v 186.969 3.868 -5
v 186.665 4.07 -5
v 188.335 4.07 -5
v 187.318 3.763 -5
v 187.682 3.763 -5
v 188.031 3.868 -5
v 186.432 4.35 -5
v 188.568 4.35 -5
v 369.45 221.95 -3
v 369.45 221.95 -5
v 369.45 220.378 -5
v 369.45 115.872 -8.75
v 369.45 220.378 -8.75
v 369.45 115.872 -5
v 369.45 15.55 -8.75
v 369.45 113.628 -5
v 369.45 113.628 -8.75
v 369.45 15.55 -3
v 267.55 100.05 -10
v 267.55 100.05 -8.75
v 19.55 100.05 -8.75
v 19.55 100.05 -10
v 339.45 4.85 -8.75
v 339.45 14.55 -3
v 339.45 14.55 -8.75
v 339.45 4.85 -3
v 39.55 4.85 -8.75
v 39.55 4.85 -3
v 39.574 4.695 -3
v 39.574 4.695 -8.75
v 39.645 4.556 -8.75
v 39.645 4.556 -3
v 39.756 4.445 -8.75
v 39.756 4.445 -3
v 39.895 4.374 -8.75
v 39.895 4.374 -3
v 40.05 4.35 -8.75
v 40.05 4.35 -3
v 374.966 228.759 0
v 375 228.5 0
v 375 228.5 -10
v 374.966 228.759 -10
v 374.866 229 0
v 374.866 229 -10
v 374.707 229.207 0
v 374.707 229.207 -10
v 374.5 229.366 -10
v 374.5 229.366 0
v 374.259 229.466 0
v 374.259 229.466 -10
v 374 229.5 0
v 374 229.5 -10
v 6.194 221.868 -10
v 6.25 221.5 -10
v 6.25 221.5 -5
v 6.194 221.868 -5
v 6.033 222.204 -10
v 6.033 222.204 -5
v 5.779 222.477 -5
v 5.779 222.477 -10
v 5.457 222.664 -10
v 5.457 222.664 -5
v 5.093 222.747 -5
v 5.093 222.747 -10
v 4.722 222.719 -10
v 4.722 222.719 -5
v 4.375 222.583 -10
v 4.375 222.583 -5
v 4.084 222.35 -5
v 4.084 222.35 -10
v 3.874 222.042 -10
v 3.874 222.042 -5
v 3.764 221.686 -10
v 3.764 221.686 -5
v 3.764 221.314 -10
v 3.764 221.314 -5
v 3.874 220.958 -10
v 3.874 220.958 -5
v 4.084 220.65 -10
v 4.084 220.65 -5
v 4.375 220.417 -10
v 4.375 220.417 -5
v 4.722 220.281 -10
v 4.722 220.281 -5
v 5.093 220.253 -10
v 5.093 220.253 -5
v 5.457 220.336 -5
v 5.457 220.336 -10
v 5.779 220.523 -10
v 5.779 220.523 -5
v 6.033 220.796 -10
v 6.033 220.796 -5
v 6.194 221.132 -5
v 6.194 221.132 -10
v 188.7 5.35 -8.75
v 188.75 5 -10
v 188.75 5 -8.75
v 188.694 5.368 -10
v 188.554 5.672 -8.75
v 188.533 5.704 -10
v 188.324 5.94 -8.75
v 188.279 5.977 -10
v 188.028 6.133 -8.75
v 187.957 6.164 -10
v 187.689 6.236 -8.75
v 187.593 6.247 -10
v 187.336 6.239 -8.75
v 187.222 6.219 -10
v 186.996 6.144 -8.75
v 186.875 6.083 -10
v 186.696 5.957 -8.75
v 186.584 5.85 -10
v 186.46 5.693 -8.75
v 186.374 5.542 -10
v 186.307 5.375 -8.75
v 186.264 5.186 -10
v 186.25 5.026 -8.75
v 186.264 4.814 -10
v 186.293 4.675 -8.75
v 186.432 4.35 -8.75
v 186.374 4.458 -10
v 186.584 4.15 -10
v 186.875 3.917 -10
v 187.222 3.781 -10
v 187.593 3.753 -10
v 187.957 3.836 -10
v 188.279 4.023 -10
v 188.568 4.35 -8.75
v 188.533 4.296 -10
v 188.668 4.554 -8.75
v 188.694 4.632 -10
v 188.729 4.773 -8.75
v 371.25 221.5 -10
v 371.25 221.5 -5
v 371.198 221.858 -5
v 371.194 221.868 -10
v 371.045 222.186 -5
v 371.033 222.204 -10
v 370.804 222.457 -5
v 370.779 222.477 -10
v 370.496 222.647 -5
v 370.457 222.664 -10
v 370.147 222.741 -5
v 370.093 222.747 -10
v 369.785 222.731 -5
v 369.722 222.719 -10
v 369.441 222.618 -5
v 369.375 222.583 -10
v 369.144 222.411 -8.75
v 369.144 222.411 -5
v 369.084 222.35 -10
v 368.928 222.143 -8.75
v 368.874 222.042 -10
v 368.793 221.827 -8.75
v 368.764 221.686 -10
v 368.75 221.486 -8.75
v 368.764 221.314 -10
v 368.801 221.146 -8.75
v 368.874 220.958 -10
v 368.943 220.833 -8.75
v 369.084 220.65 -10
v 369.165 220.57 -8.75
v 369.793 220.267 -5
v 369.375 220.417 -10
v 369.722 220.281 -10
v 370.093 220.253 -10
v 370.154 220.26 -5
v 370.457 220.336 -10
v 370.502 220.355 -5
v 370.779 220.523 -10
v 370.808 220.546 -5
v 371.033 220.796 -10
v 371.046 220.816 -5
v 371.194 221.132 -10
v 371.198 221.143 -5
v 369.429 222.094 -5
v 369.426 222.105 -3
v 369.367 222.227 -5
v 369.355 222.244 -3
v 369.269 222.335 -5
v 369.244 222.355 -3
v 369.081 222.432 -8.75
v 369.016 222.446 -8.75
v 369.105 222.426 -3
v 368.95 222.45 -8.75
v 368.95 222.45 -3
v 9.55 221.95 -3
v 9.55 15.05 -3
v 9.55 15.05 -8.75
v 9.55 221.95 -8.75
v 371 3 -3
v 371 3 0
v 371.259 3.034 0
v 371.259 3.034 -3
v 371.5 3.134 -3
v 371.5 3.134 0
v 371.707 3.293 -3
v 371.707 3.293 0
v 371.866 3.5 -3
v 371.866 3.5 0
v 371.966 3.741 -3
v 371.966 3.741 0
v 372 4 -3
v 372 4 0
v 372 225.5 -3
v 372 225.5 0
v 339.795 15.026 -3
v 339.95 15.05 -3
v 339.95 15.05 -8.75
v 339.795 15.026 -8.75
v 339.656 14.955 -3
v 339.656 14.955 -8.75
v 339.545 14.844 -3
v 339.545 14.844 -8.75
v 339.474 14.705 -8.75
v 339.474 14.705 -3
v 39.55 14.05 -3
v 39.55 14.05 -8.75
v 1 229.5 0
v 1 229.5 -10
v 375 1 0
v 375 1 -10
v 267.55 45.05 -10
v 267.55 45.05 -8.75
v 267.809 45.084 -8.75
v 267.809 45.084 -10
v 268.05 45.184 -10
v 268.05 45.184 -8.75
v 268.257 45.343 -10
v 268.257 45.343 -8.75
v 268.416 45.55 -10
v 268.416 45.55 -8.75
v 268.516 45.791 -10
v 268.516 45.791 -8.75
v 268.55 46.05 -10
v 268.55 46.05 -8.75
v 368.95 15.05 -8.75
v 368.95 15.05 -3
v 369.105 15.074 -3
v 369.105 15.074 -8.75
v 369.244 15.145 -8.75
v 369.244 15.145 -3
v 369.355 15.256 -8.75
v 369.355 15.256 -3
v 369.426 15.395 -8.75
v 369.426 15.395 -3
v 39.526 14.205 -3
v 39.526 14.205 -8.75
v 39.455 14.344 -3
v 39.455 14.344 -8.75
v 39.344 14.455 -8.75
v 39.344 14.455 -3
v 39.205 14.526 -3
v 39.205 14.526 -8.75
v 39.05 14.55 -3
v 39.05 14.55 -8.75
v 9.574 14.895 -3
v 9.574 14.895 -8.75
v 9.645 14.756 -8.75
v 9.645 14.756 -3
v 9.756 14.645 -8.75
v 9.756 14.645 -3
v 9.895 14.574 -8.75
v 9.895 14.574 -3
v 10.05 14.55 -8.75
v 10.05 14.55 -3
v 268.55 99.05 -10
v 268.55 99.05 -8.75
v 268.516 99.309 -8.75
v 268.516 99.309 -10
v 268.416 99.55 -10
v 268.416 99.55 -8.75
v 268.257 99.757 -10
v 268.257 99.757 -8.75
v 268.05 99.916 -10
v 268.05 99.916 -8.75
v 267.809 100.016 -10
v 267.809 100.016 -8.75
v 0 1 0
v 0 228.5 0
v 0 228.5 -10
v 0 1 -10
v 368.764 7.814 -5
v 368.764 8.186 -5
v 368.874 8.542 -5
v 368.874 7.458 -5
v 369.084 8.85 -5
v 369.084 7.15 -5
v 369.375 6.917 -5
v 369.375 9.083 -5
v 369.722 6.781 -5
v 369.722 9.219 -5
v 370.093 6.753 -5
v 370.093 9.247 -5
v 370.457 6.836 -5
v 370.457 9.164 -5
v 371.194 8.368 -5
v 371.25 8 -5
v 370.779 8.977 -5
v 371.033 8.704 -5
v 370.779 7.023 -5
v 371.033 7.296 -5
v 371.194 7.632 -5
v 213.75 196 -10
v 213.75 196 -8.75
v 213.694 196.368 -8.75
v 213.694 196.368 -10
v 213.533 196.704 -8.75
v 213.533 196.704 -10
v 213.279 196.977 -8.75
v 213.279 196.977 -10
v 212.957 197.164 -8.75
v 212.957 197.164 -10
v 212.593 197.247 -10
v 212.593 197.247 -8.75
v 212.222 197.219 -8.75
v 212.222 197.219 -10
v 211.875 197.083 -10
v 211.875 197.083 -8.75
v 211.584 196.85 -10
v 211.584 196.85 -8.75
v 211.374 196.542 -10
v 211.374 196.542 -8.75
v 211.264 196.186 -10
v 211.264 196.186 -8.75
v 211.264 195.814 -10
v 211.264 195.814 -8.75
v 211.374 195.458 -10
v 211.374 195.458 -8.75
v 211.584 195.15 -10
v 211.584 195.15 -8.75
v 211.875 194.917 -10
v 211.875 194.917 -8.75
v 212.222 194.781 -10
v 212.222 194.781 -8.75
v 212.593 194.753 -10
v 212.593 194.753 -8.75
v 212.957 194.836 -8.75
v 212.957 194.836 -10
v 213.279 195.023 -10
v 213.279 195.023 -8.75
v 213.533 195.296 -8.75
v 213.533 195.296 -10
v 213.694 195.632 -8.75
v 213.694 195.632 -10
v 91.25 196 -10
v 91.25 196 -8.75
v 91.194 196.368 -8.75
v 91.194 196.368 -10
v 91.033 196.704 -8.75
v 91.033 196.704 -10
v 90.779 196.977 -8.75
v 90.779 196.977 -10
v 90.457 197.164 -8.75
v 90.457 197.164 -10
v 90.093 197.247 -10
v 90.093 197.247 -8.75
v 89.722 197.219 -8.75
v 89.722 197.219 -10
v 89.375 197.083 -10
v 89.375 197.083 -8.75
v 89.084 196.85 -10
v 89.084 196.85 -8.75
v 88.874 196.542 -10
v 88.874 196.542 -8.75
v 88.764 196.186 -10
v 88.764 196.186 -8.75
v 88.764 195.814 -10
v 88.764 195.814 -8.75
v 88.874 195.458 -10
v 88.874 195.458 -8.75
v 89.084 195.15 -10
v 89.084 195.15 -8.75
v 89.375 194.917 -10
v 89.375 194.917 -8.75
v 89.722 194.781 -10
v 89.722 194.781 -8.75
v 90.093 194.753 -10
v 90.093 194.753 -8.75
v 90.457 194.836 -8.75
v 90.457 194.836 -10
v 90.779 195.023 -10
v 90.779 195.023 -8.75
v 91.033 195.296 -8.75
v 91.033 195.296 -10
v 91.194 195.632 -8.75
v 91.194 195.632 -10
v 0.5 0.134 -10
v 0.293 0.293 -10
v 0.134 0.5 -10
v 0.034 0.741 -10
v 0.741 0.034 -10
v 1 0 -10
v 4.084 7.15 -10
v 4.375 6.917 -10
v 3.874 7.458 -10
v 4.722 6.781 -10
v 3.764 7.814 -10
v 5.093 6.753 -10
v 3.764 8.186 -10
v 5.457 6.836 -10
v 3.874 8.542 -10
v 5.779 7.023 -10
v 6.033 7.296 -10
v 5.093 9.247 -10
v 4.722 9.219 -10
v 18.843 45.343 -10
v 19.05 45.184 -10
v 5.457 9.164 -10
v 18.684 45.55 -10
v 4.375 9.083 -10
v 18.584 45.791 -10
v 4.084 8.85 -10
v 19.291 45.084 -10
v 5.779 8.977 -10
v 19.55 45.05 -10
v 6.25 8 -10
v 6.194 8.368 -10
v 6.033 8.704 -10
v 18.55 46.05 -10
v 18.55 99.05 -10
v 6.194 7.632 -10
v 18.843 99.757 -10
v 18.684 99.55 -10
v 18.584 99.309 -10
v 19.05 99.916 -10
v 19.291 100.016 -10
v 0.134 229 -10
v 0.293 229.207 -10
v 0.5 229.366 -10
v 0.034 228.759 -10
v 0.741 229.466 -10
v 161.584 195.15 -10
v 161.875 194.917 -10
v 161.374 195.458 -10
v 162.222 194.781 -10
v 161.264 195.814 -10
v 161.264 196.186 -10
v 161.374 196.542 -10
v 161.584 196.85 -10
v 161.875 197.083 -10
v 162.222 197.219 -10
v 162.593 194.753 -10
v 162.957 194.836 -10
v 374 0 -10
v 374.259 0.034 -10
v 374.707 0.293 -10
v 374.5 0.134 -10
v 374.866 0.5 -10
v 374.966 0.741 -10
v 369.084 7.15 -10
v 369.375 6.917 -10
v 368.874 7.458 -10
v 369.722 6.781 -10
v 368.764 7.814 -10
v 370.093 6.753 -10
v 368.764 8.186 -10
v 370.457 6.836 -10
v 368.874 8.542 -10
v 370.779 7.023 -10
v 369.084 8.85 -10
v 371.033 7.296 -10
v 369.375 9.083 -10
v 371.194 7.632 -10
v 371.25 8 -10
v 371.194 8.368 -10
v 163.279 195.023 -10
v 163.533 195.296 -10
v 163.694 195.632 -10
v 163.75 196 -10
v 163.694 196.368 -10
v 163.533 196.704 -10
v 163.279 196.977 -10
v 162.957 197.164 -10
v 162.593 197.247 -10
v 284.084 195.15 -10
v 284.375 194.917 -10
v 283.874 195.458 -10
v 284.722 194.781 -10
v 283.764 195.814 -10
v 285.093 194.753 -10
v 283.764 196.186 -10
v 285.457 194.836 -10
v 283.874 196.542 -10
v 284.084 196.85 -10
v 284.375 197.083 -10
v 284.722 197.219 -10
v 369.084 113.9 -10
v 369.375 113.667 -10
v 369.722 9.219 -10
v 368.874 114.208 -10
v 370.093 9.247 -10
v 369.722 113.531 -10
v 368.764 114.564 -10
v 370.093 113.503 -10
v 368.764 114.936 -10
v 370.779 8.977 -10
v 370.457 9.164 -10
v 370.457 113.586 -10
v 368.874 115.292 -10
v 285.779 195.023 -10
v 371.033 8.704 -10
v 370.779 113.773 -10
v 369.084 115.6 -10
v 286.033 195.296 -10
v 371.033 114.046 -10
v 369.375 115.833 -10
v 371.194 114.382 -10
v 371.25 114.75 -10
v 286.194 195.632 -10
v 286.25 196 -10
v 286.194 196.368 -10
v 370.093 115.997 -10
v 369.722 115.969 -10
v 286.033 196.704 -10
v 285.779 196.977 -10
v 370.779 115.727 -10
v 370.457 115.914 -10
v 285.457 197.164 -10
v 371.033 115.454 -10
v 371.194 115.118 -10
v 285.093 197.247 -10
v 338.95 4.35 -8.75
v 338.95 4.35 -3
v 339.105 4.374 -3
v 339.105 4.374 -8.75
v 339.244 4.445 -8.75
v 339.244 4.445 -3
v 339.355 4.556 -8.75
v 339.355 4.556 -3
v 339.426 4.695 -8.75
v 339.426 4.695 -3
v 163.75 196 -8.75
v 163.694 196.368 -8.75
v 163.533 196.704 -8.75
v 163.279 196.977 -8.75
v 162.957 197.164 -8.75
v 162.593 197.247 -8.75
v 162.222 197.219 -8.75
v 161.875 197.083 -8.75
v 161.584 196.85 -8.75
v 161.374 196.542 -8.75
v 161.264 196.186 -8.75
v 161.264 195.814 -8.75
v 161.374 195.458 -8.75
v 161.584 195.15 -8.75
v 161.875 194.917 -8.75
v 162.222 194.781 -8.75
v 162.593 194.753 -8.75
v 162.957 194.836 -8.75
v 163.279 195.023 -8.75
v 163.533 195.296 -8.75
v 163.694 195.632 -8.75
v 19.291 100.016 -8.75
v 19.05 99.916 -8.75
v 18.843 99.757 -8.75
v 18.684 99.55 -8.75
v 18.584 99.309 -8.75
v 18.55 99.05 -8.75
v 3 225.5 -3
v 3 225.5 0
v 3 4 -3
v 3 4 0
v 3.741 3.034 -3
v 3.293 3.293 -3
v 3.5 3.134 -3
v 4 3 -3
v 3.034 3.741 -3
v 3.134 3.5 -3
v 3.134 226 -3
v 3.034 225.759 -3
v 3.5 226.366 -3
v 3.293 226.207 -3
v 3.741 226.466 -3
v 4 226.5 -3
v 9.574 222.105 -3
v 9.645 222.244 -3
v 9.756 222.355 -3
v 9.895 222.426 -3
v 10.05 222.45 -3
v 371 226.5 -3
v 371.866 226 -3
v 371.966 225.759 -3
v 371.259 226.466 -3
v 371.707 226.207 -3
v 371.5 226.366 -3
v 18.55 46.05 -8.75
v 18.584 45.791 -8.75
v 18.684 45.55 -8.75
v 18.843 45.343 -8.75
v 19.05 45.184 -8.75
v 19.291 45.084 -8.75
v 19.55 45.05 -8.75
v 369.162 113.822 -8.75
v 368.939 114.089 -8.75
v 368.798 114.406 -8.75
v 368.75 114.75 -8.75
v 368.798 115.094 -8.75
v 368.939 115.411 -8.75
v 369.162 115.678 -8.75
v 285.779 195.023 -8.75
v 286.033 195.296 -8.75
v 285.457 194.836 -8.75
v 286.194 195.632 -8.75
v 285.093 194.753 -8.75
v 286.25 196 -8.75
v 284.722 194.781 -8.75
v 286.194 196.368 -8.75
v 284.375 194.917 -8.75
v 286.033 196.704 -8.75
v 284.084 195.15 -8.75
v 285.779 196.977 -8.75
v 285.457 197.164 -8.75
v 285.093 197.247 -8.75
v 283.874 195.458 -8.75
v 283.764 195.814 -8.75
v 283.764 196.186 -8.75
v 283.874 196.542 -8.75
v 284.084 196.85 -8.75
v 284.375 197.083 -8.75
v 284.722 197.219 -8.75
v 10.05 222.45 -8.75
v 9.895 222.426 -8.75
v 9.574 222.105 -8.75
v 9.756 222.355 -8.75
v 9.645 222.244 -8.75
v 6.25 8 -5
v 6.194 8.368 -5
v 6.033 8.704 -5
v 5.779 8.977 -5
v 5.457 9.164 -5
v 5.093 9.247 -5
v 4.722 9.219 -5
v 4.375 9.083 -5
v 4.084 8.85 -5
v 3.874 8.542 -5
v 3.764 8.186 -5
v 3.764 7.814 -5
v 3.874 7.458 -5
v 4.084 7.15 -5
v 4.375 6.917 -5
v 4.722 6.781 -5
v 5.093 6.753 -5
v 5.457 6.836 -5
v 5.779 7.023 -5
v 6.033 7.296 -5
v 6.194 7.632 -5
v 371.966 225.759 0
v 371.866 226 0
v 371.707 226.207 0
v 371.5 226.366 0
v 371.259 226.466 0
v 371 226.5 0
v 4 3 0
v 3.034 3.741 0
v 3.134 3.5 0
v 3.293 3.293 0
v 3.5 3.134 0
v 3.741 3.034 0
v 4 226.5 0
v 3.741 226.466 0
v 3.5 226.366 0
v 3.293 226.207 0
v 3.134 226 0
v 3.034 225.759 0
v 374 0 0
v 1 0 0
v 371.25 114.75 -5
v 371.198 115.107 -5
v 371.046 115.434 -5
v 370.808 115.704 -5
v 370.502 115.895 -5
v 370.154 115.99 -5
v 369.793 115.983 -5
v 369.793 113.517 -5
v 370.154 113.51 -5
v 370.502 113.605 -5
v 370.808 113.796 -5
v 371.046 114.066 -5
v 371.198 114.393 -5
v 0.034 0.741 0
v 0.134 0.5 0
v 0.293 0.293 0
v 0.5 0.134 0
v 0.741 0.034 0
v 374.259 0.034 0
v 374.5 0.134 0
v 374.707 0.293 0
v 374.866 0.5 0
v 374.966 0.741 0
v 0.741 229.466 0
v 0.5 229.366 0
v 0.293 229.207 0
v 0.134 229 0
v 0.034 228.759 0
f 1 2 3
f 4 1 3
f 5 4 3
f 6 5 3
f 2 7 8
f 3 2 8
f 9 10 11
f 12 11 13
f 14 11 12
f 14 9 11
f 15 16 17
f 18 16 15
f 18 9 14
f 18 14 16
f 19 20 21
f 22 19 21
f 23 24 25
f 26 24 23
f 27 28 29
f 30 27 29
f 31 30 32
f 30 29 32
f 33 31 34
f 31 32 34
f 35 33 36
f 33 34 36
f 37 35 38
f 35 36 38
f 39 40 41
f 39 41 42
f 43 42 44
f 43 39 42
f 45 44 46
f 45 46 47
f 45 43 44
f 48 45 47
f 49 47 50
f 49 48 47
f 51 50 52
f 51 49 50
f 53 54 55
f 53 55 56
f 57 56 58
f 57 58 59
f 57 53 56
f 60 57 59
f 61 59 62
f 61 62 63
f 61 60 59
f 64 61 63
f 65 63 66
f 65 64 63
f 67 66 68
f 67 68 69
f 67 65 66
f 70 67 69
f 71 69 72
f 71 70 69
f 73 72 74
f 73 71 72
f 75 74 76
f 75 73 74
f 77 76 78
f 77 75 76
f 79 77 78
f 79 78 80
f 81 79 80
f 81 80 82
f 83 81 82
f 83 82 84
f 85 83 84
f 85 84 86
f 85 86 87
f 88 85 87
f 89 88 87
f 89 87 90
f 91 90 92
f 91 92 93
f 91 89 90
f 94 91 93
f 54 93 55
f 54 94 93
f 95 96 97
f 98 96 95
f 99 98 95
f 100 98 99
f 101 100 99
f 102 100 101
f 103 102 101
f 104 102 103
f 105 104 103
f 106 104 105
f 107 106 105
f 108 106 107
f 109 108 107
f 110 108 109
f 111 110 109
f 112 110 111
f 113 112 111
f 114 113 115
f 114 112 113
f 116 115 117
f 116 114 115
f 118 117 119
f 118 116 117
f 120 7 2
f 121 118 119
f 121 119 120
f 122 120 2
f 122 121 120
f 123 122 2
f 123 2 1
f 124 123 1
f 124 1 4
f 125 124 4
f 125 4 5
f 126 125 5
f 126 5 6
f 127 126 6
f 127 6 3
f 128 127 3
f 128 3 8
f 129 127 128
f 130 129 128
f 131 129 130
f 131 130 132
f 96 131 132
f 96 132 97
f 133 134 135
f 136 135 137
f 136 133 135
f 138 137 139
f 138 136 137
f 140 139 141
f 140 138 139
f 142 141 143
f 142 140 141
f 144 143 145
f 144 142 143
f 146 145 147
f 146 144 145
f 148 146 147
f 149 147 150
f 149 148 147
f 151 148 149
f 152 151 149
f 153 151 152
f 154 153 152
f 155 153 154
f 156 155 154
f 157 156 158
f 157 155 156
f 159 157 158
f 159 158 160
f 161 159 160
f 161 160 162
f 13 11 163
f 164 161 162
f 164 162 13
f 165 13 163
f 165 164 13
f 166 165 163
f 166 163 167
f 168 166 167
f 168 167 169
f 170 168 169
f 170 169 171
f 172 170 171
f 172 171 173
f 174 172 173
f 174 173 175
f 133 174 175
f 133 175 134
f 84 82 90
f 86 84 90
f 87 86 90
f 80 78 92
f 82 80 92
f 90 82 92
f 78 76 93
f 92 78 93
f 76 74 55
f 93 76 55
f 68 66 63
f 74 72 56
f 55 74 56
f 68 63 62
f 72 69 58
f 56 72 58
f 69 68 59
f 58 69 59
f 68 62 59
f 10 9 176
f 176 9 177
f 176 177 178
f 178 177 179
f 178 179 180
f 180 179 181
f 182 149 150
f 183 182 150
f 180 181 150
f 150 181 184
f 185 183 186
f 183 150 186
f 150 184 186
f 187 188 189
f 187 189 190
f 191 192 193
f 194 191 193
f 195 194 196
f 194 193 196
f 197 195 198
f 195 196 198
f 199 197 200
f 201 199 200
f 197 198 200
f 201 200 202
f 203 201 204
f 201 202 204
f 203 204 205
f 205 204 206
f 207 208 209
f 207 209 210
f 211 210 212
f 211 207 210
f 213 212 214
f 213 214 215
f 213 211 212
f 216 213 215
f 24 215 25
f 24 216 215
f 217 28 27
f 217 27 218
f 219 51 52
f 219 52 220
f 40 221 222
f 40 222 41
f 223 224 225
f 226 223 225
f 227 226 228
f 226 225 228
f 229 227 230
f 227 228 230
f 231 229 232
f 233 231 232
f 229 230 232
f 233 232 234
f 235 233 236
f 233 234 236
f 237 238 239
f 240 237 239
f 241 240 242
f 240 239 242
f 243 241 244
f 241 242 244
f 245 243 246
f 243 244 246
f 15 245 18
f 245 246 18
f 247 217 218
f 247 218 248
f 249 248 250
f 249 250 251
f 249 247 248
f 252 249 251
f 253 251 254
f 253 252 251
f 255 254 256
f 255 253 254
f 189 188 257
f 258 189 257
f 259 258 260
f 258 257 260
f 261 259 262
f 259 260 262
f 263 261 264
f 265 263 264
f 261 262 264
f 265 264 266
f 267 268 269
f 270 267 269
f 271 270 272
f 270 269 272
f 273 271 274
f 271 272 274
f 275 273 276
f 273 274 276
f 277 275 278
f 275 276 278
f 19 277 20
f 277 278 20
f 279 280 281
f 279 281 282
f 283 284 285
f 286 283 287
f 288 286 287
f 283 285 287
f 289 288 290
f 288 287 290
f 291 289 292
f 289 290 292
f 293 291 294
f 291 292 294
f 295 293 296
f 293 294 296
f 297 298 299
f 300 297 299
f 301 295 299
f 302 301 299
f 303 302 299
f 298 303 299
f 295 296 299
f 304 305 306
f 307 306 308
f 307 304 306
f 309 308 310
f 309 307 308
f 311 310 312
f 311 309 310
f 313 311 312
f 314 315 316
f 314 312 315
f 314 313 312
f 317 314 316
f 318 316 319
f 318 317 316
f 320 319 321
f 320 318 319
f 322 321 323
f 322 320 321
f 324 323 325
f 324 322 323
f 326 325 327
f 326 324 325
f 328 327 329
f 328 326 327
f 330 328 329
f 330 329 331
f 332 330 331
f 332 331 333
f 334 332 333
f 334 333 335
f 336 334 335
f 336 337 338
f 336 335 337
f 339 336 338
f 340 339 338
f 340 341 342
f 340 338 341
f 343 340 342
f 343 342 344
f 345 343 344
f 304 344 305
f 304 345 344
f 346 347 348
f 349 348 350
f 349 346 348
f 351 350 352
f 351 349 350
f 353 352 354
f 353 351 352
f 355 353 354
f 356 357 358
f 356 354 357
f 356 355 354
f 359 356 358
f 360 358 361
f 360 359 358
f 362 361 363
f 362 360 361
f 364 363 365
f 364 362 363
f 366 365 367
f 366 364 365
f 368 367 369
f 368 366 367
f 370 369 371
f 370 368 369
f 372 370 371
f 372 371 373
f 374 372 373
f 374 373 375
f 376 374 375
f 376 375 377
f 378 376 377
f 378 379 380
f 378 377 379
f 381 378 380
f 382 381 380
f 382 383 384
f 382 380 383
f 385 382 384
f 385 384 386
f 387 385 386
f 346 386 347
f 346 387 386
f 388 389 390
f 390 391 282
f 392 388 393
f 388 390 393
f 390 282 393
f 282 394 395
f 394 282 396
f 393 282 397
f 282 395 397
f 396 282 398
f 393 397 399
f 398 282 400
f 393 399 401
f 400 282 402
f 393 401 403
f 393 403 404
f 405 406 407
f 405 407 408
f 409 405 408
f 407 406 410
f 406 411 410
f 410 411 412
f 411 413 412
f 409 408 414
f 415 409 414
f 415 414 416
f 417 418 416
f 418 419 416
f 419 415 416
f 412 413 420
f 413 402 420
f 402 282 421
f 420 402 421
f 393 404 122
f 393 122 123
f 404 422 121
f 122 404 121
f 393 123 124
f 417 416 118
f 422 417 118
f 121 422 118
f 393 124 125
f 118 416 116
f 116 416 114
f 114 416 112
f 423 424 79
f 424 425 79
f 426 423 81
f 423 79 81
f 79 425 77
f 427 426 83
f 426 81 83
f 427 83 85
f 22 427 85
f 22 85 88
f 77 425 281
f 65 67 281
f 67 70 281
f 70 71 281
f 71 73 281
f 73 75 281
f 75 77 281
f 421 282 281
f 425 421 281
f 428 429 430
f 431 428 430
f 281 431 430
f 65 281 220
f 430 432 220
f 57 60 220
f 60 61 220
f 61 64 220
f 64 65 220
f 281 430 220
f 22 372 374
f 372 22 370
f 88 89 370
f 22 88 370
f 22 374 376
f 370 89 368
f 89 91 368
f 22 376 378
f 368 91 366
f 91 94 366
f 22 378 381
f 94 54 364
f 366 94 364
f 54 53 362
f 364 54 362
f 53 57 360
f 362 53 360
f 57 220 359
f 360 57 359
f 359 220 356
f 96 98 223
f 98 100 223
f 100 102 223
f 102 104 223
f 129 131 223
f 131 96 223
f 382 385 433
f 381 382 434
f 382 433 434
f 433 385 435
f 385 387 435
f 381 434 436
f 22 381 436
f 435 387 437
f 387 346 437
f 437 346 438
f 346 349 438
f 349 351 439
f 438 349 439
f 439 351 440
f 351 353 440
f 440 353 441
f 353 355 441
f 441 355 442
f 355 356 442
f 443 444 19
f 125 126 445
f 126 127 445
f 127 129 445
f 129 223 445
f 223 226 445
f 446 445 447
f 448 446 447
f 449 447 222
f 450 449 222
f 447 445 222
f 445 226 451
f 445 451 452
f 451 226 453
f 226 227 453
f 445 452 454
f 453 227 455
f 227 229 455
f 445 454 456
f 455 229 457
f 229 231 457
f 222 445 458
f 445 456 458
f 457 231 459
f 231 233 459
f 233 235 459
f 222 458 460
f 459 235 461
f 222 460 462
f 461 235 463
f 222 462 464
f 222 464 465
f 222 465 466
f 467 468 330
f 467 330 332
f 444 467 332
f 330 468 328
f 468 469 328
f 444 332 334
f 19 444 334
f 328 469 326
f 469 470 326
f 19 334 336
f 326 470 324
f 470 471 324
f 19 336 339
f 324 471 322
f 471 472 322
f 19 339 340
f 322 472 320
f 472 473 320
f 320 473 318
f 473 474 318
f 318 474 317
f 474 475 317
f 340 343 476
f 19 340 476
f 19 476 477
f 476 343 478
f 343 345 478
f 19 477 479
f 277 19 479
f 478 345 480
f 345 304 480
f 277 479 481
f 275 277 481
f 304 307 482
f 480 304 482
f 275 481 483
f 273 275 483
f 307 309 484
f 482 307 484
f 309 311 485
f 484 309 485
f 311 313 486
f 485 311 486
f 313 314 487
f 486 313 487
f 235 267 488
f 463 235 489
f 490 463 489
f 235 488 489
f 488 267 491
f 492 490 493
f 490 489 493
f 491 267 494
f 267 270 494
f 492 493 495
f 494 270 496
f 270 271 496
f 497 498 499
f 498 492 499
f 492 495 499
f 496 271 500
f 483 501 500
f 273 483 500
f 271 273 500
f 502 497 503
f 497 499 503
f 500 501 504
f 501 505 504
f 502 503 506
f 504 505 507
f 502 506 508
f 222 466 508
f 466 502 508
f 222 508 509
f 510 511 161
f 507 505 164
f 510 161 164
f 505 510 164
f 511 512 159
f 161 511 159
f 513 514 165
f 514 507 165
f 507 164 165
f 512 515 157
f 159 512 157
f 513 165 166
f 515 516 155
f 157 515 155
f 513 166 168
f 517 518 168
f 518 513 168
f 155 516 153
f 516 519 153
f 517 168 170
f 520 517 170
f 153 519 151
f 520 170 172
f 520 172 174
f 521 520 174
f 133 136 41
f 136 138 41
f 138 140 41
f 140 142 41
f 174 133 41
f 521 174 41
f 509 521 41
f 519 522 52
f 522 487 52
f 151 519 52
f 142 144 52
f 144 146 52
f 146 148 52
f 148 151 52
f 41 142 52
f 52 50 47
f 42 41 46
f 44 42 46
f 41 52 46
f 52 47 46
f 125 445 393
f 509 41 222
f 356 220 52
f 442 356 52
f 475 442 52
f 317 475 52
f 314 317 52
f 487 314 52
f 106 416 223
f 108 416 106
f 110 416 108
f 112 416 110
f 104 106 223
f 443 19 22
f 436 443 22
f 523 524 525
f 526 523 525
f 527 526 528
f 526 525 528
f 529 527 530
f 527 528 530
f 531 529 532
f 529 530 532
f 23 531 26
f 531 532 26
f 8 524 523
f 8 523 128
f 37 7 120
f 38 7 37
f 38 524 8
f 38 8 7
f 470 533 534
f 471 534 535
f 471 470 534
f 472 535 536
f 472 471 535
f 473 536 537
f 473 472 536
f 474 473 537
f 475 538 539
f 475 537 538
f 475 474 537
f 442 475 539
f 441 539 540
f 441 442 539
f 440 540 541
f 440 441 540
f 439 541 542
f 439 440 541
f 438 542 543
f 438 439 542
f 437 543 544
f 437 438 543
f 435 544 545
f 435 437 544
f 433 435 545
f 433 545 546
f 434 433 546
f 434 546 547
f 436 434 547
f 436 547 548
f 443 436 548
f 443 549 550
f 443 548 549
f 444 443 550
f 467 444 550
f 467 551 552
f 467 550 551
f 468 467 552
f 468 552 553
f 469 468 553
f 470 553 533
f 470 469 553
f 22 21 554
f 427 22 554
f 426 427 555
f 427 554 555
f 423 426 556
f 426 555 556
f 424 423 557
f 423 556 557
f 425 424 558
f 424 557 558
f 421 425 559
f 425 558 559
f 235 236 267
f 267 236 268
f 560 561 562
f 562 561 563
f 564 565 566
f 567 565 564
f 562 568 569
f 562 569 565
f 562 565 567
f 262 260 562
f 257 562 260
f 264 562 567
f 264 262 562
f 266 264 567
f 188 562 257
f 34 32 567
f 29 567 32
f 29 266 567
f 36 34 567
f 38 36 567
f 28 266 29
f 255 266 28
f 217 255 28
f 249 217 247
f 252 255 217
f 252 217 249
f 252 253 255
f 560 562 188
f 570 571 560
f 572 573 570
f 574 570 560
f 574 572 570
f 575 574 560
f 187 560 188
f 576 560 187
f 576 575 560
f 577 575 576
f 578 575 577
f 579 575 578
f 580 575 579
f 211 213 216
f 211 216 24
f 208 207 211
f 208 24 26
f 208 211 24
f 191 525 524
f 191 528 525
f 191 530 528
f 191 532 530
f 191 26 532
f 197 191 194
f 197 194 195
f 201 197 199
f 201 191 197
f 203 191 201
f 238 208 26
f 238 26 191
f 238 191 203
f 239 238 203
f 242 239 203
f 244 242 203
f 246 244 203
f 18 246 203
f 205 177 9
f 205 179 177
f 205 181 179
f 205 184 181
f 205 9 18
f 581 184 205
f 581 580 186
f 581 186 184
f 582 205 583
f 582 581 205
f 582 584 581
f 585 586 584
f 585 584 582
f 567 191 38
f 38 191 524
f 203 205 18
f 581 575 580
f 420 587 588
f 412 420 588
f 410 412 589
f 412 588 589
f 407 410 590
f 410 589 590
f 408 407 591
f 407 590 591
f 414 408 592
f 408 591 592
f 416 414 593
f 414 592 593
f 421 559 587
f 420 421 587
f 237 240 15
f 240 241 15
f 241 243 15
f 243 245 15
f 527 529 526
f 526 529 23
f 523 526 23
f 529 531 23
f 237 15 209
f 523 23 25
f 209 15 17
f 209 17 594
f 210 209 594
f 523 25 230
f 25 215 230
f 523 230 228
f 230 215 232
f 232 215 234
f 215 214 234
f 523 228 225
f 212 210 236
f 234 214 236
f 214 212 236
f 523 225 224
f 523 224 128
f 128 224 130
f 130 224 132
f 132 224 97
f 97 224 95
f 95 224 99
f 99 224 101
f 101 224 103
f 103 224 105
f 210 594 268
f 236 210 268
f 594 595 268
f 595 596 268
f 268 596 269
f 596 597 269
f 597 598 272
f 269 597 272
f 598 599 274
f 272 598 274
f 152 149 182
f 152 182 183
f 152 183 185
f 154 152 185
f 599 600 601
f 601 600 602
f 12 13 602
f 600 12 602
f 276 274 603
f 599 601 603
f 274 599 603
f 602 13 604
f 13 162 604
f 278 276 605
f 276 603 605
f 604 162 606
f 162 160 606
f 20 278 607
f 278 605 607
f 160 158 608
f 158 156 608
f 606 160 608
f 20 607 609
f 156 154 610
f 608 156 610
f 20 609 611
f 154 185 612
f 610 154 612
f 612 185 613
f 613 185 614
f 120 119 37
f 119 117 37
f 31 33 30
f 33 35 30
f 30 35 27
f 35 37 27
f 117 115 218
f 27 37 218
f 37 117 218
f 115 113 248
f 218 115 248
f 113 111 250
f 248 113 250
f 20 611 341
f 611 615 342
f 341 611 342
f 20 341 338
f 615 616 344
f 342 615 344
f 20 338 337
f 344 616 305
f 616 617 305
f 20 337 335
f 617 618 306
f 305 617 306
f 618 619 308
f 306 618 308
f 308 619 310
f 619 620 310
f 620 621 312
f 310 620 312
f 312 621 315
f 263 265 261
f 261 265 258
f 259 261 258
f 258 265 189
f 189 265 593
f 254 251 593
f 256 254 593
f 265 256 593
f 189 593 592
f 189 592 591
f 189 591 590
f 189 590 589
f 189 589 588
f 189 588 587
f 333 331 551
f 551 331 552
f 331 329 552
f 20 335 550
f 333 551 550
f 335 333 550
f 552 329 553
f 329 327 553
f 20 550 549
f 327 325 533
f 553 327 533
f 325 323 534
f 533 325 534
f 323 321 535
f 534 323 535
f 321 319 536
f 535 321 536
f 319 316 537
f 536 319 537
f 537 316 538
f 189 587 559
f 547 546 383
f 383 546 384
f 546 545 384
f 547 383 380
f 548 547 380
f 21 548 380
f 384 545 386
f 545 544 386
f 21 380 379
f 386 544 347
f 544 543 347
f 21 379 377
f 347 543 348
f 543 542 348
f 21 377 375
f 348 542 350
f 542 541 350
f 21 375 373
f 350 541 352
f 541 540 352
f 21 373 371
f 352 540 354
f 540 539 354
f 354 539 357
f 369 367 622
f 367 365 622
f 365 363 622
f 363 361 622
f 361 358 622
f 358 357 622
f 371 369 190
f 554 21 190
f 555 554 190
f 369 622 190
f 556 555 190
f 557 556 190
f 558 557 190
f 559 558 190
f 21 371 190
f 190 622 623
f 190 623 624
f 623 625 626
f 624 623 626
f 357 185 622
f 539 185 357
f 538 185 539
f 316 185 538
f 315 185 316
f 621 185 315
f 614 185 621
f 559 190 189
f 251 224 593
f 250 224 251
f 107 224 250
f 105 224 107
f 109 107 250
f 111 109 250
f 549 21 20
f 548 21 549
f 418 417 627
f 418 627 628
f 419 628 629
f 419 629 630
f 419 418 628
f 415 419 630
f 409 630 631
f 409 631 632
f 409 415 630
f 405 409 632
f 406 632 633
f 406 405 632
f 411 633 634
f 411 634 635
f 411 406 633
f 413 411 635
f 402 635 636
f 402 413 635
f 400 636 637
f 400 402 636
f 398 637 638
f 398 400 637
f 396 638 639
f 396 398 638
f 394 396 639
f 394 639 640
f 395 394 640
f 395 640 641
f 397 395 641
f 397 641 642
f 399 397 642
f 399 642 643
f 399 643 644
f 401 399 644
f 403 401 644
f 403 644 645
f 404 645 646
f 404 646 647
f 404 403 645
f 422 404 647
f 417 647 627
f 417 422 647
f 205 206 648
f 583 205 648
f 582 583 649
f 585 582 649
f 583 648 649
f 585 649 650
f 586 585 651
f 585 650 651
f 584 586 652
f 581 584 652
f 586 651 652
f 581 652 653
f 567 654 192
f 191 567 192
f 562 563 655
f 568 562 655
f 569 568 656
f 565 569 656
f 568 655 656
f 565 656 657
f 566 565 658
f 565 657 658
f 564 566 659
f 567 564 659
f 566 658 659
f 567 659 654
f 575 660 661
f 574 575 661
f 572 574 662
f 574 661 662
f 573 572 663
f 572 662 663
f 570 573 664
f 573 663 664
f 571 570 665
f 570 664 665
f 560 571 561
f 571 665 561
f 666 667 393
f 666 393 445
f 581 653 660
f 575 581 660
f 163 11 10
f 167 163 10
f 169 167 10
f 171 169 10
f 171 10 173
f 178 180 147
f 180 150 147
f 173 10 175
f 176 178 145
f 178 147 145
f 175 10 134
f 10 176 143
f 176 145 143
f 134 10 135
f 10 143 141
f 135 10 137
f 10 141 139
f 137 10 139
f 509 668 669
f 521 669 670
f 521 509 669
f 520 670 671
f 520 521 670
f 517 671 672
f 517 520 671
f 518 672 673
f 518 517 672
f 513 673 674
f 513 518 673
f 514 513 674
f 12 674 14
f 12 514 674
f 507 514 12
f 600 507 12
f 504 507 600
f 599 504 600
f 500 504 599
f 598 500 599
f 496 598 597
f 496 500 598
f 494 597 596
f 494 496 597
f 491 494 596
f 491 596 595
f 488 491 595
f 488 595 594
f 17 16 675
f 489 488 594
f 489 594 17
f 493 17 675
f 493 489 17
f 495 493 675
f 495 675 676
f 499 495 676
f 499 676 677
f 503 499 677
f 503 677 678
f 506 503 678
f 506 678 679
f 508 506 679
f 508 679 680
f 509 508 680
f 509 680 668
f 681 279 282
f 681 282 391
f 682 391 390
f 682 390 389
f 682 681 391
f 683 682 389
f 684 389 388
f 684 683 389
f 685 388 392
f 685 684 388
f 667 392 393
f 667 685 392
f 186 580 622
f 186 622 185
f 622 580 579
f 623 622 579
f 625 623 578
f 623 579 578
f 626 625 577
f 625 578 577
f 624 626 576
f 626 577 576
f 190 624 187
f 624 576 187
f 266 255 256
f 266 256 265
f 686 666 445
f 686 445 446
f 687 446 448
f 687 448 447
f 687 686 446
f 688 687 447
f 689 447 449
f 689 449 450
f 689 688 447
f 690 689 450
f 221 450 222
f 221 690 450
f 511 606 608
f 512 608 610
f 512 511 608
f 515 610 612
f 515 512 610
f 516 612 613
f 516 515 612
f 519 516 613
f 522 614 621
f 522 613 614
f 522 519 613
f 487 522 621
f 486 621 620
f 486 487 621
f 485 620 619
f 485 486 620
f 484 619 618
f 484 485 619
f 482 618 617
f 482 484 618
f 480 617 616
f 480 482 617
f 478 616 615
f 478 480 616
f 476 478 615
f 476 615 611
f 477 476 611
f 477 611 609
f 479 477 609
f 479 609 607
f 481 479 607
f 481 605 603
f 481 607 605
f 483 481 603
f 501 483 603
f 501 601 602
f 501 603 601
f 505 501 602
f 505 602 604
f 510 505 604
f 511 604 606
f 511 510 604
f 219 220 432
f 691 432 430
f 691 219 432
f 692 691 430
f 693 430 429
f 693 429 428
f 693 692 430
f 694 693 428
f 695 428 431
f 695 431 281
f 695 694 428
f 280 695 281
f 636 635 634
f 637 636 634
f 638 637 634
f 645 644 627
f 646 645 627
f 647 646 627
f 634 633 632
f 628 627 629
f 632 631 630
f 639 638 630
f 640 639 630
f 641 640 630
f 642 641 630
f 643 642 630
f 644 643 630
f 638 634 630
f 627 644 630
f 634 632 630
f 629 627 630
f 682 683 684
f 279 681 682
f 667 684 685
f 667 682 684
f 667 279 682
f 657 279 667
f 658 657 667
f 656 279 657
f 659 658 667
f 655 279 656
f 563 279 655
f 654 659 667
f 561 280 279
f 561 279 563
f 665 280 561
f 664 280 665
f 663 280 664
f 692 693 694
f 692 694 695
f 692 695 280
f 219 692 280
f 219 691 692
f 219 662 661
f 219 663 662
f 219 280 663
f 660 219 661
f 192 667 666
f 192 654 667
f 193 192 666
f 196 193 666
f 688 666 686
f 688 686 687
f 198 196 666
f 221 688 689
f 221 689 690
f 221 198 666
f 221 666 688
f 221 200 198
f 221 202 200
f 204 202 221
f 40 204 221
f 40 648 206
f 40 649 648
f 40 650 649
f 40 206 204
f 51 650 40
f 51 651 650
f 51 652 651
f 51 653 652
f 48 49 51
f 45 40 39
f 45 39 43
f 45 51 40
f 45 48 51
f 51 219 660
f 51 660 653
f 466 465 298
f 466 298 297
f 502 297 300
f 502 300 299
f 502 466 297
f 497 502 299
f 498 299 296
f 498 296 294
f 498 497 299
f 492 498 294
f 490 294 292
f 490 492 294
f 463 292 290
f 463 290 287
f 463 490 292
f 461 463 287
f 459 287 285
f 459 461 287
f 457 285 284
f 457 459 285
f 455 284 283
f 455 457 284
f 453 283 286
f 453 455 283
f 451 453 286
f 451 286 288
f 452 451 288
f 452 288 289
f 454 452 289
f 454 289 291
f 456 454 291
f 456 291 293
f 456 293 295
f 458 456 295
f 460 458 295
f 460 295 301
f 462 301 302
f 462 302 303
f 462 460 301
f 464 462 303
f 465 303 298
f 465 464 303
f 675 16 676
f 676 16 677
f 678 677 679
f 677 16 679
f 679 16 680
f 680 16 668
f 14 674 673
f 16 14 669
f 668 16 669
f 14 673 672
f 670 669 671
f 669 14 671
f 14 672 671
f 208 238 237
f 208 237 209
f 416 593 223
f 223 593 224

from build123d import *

# Parameters (mm, degrees)
PAD006_DEPTH    = 10
POCKET_DEPTH    = 3
POCKET001_DEPTH = 8.75
POCKET002_DEPTH = 10.001
SKETCH071_R     = 1.25
POCKET032_DEPTH = 5


with BuildPart() as part:
    # Sketch006 → Pad006 (new body)
    with BuildSketch(Plane.XY):
        with BuildLine():
            Line((1, 0), (374, 0))
            ThreePointArc((374, 0), (374.707107, 0.292893), (375, 1))
            Line((375, 1), (375, 228.5))
            ThreePointArc((375, 228.5), (374.707107, 229.207107), (374, 229.5))
            Line((374, 229.5), (1, 229.5))
            ThreePointArc((1, 229.5), (0.292893, 229.207107), (0, 228.5))
            Line((0, 228.5), (0, 1))
            ThreePointArc((0, 1), (0.292893, 0.292893), (1, 0))
        make_face()
    extrude(amount=-PAD006_DEPTH)

    # Sketch007 → Pocket (cut)
    with BuildSketch(Plane.XY):
        with BuildLine():
            Line((4, 3), (371, 3))
            ThreePointArc((371, 3), (371.707107, 3.292893), (372, 4))
            Line((372, 4), (372, 225.5))
            ThreePointArc((372, 225.5), (371.707107, 226.207107), (371, 226.5))
            Line((371, 226.5), (4, 226.5))
            ThreePointArc((4, 226.5), (3.292893, 226.207107), (3, 225.5))
            Line((3, 225.5), (3, 4))
            ThreePointArc((3, 4), (3.292893, 3.292893), (4, 3))
        make_face()
    extrude(amount=-POCKET_DEPTH, mode=Mode.SUBTRACT)

    # Sketch008 → Pocket001 (cut)
    with BuildSketch(Plane.XY):
        with BuildLine():
            Line((10.05, 222.45), (368.95, 222.45))
            ThreePointArc((369.45, 221.95), (369.303553, 222.303553), (368.95, 222.45))
            Line((369.45, 221.95), (369.45, 15.55))
            ThreePointArc((368.95, 15.05), (369.303553, 15.196447), (369.45, 15.55))
            Line((368.95, 15.05), (339.95, 15.05))
            ThreePointArc((339.95, 15.05), (339.596447, 14.903553), (339.45, 14.55))
            Line((339.45, 14.55), (339.45, 4.85))
            ThreePointArc((338.95, 4.35), (339.303553, 4.496447), (339.45, 4.85))
            Line((338.95, 4.35), (40.05, 4.35))
            ThreePointArc((39.55, 4.85), (39.696447, 4.496447), (40.05, 4.35))
            Line((39.55, 4.85), (39.55, 14.05))
            ThreePointArc((39.55, 14.05), (39.403553, 14.403553), (39.05, 14.55))
            Line((39.05, 14.55), (10.05, 14.55))
            ThreePointArc((9.55, 15.05), (9.696447, 14.696447), (10.05, 14.55))
            Line((9.55, 15.05), (9.55, 221.95))
            ThreePointArc((10.05, 222.45), (9.696447, 222.303553), (9.55, 221.95))
        make_face()
    extrude(amount=-POCKET001_DEPTH, mode=Mode.SUBTRACT)

    # Sketch009 → Pocket002 (cut, through all)
    with BuildSketch(Plane.XY):
        with BuildLine():
            Line((19.55, 45.05), (267.55, 45.05))
            ThreePointArc((267.55, 45.05), (268.257107, 45.342893), (268.55, 46.05))
            Line((268.55, 46.05), (268.55, 99.05))
            ThreePointArc((268.55, 99.05), (268.257107, 99.757107), (267.55, 100.05))
            Line((267.55, 100.05), (19.55, 100.05))
            ThreePointArc((19.55, 100.05), (18.842893, 99.757107), (18.55, 99.05))
            Line((18.55, 99.05), (18.55, 46.05))
            ThreePointArc((18.55, 46.05), (18.842893, 45.342893), (19.55, 45.05))
        make_face()
    extrude(amount=-POCKET002_DEPTH, mode=Mode.SUBTRACT)

    # Sketch071 (on DatumPlane) → Pocket032 (cut)
    with BuildSketch(Plane.XY.offset(-10)):
        with Locations((5, 221.5)):
            Circle(SKETCH071_R)
        with Locations((5, 8)):
            Circle(SKETCH071_R)
        with Locations((370, 8)):
            Circle(SKETCH071_R)
        with Locations((370, 221.5)):
            Circle(SKETCH071_R)
        with Locations((370, 114.75)):
            Circle(SKETCH071_R)
        with Locations((162.5, 196)):
            Circle(SKETCH071_R)
        with Locations((212.5, 196)):
            Circle(SKETCH071_R)
        with Locations((90, 196)):
            Circle(SKETCH071_R)
        with Locations((285, 196)):
            Circle(SKETCH071_R)
        with Locations((187.5, 5)):
            Circle(SKETCH071_R)
    extrude(amount=POCKET032_DEPTH, mode=Mode.SUBTRACT)


solid = part.part
